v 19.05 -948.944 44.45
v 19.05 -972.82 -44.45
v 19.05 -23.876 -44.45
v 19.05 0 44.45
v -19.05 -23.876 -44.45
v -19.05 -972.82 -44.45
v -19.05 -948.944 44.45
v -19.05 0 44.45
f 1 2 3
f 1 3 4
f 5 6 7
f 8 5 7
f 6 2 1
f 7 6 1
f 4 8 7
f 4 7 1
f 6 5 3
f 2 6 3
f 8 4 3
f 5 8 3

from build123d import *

# Parameters (mm, degrees)
F0_W     = 38.1
F0_H     = 88.9
F1_DEPTH = 972.82
F3_DEPTH = 25.4
F5_DEPTH = 25.4


with BuildPart() as f1:
    # F0 (on Front) → F1 (new body)
    with BuildSketch(Plane.XZ):
        Rectangle(F0_W, F0_H)
    extrude(amount=F1_DEPTH)

    # F2 (on Right) → F3 (cut, symmetric)
    with BuildSketch(Plane.YZ):
        Polygon((-972.82, -44.45), (-948.944, 44.45), (-972.82, 44.45), align=None)
    extrude(amount=F3_DEPTH, both=True, mode=Mode.SUBTRACT)

    # F4 (on Right) → F5 (cut, symmetric)
    with BuildSketch(Plane.YZ):
        Polygon((0, -44.45), (0, 44.45), (-23.876, -44.45), align=None)
    extrude(amount=F5_DEPTH, both=True, mode=Mode.SUBTRACT)


solid = f1.part
